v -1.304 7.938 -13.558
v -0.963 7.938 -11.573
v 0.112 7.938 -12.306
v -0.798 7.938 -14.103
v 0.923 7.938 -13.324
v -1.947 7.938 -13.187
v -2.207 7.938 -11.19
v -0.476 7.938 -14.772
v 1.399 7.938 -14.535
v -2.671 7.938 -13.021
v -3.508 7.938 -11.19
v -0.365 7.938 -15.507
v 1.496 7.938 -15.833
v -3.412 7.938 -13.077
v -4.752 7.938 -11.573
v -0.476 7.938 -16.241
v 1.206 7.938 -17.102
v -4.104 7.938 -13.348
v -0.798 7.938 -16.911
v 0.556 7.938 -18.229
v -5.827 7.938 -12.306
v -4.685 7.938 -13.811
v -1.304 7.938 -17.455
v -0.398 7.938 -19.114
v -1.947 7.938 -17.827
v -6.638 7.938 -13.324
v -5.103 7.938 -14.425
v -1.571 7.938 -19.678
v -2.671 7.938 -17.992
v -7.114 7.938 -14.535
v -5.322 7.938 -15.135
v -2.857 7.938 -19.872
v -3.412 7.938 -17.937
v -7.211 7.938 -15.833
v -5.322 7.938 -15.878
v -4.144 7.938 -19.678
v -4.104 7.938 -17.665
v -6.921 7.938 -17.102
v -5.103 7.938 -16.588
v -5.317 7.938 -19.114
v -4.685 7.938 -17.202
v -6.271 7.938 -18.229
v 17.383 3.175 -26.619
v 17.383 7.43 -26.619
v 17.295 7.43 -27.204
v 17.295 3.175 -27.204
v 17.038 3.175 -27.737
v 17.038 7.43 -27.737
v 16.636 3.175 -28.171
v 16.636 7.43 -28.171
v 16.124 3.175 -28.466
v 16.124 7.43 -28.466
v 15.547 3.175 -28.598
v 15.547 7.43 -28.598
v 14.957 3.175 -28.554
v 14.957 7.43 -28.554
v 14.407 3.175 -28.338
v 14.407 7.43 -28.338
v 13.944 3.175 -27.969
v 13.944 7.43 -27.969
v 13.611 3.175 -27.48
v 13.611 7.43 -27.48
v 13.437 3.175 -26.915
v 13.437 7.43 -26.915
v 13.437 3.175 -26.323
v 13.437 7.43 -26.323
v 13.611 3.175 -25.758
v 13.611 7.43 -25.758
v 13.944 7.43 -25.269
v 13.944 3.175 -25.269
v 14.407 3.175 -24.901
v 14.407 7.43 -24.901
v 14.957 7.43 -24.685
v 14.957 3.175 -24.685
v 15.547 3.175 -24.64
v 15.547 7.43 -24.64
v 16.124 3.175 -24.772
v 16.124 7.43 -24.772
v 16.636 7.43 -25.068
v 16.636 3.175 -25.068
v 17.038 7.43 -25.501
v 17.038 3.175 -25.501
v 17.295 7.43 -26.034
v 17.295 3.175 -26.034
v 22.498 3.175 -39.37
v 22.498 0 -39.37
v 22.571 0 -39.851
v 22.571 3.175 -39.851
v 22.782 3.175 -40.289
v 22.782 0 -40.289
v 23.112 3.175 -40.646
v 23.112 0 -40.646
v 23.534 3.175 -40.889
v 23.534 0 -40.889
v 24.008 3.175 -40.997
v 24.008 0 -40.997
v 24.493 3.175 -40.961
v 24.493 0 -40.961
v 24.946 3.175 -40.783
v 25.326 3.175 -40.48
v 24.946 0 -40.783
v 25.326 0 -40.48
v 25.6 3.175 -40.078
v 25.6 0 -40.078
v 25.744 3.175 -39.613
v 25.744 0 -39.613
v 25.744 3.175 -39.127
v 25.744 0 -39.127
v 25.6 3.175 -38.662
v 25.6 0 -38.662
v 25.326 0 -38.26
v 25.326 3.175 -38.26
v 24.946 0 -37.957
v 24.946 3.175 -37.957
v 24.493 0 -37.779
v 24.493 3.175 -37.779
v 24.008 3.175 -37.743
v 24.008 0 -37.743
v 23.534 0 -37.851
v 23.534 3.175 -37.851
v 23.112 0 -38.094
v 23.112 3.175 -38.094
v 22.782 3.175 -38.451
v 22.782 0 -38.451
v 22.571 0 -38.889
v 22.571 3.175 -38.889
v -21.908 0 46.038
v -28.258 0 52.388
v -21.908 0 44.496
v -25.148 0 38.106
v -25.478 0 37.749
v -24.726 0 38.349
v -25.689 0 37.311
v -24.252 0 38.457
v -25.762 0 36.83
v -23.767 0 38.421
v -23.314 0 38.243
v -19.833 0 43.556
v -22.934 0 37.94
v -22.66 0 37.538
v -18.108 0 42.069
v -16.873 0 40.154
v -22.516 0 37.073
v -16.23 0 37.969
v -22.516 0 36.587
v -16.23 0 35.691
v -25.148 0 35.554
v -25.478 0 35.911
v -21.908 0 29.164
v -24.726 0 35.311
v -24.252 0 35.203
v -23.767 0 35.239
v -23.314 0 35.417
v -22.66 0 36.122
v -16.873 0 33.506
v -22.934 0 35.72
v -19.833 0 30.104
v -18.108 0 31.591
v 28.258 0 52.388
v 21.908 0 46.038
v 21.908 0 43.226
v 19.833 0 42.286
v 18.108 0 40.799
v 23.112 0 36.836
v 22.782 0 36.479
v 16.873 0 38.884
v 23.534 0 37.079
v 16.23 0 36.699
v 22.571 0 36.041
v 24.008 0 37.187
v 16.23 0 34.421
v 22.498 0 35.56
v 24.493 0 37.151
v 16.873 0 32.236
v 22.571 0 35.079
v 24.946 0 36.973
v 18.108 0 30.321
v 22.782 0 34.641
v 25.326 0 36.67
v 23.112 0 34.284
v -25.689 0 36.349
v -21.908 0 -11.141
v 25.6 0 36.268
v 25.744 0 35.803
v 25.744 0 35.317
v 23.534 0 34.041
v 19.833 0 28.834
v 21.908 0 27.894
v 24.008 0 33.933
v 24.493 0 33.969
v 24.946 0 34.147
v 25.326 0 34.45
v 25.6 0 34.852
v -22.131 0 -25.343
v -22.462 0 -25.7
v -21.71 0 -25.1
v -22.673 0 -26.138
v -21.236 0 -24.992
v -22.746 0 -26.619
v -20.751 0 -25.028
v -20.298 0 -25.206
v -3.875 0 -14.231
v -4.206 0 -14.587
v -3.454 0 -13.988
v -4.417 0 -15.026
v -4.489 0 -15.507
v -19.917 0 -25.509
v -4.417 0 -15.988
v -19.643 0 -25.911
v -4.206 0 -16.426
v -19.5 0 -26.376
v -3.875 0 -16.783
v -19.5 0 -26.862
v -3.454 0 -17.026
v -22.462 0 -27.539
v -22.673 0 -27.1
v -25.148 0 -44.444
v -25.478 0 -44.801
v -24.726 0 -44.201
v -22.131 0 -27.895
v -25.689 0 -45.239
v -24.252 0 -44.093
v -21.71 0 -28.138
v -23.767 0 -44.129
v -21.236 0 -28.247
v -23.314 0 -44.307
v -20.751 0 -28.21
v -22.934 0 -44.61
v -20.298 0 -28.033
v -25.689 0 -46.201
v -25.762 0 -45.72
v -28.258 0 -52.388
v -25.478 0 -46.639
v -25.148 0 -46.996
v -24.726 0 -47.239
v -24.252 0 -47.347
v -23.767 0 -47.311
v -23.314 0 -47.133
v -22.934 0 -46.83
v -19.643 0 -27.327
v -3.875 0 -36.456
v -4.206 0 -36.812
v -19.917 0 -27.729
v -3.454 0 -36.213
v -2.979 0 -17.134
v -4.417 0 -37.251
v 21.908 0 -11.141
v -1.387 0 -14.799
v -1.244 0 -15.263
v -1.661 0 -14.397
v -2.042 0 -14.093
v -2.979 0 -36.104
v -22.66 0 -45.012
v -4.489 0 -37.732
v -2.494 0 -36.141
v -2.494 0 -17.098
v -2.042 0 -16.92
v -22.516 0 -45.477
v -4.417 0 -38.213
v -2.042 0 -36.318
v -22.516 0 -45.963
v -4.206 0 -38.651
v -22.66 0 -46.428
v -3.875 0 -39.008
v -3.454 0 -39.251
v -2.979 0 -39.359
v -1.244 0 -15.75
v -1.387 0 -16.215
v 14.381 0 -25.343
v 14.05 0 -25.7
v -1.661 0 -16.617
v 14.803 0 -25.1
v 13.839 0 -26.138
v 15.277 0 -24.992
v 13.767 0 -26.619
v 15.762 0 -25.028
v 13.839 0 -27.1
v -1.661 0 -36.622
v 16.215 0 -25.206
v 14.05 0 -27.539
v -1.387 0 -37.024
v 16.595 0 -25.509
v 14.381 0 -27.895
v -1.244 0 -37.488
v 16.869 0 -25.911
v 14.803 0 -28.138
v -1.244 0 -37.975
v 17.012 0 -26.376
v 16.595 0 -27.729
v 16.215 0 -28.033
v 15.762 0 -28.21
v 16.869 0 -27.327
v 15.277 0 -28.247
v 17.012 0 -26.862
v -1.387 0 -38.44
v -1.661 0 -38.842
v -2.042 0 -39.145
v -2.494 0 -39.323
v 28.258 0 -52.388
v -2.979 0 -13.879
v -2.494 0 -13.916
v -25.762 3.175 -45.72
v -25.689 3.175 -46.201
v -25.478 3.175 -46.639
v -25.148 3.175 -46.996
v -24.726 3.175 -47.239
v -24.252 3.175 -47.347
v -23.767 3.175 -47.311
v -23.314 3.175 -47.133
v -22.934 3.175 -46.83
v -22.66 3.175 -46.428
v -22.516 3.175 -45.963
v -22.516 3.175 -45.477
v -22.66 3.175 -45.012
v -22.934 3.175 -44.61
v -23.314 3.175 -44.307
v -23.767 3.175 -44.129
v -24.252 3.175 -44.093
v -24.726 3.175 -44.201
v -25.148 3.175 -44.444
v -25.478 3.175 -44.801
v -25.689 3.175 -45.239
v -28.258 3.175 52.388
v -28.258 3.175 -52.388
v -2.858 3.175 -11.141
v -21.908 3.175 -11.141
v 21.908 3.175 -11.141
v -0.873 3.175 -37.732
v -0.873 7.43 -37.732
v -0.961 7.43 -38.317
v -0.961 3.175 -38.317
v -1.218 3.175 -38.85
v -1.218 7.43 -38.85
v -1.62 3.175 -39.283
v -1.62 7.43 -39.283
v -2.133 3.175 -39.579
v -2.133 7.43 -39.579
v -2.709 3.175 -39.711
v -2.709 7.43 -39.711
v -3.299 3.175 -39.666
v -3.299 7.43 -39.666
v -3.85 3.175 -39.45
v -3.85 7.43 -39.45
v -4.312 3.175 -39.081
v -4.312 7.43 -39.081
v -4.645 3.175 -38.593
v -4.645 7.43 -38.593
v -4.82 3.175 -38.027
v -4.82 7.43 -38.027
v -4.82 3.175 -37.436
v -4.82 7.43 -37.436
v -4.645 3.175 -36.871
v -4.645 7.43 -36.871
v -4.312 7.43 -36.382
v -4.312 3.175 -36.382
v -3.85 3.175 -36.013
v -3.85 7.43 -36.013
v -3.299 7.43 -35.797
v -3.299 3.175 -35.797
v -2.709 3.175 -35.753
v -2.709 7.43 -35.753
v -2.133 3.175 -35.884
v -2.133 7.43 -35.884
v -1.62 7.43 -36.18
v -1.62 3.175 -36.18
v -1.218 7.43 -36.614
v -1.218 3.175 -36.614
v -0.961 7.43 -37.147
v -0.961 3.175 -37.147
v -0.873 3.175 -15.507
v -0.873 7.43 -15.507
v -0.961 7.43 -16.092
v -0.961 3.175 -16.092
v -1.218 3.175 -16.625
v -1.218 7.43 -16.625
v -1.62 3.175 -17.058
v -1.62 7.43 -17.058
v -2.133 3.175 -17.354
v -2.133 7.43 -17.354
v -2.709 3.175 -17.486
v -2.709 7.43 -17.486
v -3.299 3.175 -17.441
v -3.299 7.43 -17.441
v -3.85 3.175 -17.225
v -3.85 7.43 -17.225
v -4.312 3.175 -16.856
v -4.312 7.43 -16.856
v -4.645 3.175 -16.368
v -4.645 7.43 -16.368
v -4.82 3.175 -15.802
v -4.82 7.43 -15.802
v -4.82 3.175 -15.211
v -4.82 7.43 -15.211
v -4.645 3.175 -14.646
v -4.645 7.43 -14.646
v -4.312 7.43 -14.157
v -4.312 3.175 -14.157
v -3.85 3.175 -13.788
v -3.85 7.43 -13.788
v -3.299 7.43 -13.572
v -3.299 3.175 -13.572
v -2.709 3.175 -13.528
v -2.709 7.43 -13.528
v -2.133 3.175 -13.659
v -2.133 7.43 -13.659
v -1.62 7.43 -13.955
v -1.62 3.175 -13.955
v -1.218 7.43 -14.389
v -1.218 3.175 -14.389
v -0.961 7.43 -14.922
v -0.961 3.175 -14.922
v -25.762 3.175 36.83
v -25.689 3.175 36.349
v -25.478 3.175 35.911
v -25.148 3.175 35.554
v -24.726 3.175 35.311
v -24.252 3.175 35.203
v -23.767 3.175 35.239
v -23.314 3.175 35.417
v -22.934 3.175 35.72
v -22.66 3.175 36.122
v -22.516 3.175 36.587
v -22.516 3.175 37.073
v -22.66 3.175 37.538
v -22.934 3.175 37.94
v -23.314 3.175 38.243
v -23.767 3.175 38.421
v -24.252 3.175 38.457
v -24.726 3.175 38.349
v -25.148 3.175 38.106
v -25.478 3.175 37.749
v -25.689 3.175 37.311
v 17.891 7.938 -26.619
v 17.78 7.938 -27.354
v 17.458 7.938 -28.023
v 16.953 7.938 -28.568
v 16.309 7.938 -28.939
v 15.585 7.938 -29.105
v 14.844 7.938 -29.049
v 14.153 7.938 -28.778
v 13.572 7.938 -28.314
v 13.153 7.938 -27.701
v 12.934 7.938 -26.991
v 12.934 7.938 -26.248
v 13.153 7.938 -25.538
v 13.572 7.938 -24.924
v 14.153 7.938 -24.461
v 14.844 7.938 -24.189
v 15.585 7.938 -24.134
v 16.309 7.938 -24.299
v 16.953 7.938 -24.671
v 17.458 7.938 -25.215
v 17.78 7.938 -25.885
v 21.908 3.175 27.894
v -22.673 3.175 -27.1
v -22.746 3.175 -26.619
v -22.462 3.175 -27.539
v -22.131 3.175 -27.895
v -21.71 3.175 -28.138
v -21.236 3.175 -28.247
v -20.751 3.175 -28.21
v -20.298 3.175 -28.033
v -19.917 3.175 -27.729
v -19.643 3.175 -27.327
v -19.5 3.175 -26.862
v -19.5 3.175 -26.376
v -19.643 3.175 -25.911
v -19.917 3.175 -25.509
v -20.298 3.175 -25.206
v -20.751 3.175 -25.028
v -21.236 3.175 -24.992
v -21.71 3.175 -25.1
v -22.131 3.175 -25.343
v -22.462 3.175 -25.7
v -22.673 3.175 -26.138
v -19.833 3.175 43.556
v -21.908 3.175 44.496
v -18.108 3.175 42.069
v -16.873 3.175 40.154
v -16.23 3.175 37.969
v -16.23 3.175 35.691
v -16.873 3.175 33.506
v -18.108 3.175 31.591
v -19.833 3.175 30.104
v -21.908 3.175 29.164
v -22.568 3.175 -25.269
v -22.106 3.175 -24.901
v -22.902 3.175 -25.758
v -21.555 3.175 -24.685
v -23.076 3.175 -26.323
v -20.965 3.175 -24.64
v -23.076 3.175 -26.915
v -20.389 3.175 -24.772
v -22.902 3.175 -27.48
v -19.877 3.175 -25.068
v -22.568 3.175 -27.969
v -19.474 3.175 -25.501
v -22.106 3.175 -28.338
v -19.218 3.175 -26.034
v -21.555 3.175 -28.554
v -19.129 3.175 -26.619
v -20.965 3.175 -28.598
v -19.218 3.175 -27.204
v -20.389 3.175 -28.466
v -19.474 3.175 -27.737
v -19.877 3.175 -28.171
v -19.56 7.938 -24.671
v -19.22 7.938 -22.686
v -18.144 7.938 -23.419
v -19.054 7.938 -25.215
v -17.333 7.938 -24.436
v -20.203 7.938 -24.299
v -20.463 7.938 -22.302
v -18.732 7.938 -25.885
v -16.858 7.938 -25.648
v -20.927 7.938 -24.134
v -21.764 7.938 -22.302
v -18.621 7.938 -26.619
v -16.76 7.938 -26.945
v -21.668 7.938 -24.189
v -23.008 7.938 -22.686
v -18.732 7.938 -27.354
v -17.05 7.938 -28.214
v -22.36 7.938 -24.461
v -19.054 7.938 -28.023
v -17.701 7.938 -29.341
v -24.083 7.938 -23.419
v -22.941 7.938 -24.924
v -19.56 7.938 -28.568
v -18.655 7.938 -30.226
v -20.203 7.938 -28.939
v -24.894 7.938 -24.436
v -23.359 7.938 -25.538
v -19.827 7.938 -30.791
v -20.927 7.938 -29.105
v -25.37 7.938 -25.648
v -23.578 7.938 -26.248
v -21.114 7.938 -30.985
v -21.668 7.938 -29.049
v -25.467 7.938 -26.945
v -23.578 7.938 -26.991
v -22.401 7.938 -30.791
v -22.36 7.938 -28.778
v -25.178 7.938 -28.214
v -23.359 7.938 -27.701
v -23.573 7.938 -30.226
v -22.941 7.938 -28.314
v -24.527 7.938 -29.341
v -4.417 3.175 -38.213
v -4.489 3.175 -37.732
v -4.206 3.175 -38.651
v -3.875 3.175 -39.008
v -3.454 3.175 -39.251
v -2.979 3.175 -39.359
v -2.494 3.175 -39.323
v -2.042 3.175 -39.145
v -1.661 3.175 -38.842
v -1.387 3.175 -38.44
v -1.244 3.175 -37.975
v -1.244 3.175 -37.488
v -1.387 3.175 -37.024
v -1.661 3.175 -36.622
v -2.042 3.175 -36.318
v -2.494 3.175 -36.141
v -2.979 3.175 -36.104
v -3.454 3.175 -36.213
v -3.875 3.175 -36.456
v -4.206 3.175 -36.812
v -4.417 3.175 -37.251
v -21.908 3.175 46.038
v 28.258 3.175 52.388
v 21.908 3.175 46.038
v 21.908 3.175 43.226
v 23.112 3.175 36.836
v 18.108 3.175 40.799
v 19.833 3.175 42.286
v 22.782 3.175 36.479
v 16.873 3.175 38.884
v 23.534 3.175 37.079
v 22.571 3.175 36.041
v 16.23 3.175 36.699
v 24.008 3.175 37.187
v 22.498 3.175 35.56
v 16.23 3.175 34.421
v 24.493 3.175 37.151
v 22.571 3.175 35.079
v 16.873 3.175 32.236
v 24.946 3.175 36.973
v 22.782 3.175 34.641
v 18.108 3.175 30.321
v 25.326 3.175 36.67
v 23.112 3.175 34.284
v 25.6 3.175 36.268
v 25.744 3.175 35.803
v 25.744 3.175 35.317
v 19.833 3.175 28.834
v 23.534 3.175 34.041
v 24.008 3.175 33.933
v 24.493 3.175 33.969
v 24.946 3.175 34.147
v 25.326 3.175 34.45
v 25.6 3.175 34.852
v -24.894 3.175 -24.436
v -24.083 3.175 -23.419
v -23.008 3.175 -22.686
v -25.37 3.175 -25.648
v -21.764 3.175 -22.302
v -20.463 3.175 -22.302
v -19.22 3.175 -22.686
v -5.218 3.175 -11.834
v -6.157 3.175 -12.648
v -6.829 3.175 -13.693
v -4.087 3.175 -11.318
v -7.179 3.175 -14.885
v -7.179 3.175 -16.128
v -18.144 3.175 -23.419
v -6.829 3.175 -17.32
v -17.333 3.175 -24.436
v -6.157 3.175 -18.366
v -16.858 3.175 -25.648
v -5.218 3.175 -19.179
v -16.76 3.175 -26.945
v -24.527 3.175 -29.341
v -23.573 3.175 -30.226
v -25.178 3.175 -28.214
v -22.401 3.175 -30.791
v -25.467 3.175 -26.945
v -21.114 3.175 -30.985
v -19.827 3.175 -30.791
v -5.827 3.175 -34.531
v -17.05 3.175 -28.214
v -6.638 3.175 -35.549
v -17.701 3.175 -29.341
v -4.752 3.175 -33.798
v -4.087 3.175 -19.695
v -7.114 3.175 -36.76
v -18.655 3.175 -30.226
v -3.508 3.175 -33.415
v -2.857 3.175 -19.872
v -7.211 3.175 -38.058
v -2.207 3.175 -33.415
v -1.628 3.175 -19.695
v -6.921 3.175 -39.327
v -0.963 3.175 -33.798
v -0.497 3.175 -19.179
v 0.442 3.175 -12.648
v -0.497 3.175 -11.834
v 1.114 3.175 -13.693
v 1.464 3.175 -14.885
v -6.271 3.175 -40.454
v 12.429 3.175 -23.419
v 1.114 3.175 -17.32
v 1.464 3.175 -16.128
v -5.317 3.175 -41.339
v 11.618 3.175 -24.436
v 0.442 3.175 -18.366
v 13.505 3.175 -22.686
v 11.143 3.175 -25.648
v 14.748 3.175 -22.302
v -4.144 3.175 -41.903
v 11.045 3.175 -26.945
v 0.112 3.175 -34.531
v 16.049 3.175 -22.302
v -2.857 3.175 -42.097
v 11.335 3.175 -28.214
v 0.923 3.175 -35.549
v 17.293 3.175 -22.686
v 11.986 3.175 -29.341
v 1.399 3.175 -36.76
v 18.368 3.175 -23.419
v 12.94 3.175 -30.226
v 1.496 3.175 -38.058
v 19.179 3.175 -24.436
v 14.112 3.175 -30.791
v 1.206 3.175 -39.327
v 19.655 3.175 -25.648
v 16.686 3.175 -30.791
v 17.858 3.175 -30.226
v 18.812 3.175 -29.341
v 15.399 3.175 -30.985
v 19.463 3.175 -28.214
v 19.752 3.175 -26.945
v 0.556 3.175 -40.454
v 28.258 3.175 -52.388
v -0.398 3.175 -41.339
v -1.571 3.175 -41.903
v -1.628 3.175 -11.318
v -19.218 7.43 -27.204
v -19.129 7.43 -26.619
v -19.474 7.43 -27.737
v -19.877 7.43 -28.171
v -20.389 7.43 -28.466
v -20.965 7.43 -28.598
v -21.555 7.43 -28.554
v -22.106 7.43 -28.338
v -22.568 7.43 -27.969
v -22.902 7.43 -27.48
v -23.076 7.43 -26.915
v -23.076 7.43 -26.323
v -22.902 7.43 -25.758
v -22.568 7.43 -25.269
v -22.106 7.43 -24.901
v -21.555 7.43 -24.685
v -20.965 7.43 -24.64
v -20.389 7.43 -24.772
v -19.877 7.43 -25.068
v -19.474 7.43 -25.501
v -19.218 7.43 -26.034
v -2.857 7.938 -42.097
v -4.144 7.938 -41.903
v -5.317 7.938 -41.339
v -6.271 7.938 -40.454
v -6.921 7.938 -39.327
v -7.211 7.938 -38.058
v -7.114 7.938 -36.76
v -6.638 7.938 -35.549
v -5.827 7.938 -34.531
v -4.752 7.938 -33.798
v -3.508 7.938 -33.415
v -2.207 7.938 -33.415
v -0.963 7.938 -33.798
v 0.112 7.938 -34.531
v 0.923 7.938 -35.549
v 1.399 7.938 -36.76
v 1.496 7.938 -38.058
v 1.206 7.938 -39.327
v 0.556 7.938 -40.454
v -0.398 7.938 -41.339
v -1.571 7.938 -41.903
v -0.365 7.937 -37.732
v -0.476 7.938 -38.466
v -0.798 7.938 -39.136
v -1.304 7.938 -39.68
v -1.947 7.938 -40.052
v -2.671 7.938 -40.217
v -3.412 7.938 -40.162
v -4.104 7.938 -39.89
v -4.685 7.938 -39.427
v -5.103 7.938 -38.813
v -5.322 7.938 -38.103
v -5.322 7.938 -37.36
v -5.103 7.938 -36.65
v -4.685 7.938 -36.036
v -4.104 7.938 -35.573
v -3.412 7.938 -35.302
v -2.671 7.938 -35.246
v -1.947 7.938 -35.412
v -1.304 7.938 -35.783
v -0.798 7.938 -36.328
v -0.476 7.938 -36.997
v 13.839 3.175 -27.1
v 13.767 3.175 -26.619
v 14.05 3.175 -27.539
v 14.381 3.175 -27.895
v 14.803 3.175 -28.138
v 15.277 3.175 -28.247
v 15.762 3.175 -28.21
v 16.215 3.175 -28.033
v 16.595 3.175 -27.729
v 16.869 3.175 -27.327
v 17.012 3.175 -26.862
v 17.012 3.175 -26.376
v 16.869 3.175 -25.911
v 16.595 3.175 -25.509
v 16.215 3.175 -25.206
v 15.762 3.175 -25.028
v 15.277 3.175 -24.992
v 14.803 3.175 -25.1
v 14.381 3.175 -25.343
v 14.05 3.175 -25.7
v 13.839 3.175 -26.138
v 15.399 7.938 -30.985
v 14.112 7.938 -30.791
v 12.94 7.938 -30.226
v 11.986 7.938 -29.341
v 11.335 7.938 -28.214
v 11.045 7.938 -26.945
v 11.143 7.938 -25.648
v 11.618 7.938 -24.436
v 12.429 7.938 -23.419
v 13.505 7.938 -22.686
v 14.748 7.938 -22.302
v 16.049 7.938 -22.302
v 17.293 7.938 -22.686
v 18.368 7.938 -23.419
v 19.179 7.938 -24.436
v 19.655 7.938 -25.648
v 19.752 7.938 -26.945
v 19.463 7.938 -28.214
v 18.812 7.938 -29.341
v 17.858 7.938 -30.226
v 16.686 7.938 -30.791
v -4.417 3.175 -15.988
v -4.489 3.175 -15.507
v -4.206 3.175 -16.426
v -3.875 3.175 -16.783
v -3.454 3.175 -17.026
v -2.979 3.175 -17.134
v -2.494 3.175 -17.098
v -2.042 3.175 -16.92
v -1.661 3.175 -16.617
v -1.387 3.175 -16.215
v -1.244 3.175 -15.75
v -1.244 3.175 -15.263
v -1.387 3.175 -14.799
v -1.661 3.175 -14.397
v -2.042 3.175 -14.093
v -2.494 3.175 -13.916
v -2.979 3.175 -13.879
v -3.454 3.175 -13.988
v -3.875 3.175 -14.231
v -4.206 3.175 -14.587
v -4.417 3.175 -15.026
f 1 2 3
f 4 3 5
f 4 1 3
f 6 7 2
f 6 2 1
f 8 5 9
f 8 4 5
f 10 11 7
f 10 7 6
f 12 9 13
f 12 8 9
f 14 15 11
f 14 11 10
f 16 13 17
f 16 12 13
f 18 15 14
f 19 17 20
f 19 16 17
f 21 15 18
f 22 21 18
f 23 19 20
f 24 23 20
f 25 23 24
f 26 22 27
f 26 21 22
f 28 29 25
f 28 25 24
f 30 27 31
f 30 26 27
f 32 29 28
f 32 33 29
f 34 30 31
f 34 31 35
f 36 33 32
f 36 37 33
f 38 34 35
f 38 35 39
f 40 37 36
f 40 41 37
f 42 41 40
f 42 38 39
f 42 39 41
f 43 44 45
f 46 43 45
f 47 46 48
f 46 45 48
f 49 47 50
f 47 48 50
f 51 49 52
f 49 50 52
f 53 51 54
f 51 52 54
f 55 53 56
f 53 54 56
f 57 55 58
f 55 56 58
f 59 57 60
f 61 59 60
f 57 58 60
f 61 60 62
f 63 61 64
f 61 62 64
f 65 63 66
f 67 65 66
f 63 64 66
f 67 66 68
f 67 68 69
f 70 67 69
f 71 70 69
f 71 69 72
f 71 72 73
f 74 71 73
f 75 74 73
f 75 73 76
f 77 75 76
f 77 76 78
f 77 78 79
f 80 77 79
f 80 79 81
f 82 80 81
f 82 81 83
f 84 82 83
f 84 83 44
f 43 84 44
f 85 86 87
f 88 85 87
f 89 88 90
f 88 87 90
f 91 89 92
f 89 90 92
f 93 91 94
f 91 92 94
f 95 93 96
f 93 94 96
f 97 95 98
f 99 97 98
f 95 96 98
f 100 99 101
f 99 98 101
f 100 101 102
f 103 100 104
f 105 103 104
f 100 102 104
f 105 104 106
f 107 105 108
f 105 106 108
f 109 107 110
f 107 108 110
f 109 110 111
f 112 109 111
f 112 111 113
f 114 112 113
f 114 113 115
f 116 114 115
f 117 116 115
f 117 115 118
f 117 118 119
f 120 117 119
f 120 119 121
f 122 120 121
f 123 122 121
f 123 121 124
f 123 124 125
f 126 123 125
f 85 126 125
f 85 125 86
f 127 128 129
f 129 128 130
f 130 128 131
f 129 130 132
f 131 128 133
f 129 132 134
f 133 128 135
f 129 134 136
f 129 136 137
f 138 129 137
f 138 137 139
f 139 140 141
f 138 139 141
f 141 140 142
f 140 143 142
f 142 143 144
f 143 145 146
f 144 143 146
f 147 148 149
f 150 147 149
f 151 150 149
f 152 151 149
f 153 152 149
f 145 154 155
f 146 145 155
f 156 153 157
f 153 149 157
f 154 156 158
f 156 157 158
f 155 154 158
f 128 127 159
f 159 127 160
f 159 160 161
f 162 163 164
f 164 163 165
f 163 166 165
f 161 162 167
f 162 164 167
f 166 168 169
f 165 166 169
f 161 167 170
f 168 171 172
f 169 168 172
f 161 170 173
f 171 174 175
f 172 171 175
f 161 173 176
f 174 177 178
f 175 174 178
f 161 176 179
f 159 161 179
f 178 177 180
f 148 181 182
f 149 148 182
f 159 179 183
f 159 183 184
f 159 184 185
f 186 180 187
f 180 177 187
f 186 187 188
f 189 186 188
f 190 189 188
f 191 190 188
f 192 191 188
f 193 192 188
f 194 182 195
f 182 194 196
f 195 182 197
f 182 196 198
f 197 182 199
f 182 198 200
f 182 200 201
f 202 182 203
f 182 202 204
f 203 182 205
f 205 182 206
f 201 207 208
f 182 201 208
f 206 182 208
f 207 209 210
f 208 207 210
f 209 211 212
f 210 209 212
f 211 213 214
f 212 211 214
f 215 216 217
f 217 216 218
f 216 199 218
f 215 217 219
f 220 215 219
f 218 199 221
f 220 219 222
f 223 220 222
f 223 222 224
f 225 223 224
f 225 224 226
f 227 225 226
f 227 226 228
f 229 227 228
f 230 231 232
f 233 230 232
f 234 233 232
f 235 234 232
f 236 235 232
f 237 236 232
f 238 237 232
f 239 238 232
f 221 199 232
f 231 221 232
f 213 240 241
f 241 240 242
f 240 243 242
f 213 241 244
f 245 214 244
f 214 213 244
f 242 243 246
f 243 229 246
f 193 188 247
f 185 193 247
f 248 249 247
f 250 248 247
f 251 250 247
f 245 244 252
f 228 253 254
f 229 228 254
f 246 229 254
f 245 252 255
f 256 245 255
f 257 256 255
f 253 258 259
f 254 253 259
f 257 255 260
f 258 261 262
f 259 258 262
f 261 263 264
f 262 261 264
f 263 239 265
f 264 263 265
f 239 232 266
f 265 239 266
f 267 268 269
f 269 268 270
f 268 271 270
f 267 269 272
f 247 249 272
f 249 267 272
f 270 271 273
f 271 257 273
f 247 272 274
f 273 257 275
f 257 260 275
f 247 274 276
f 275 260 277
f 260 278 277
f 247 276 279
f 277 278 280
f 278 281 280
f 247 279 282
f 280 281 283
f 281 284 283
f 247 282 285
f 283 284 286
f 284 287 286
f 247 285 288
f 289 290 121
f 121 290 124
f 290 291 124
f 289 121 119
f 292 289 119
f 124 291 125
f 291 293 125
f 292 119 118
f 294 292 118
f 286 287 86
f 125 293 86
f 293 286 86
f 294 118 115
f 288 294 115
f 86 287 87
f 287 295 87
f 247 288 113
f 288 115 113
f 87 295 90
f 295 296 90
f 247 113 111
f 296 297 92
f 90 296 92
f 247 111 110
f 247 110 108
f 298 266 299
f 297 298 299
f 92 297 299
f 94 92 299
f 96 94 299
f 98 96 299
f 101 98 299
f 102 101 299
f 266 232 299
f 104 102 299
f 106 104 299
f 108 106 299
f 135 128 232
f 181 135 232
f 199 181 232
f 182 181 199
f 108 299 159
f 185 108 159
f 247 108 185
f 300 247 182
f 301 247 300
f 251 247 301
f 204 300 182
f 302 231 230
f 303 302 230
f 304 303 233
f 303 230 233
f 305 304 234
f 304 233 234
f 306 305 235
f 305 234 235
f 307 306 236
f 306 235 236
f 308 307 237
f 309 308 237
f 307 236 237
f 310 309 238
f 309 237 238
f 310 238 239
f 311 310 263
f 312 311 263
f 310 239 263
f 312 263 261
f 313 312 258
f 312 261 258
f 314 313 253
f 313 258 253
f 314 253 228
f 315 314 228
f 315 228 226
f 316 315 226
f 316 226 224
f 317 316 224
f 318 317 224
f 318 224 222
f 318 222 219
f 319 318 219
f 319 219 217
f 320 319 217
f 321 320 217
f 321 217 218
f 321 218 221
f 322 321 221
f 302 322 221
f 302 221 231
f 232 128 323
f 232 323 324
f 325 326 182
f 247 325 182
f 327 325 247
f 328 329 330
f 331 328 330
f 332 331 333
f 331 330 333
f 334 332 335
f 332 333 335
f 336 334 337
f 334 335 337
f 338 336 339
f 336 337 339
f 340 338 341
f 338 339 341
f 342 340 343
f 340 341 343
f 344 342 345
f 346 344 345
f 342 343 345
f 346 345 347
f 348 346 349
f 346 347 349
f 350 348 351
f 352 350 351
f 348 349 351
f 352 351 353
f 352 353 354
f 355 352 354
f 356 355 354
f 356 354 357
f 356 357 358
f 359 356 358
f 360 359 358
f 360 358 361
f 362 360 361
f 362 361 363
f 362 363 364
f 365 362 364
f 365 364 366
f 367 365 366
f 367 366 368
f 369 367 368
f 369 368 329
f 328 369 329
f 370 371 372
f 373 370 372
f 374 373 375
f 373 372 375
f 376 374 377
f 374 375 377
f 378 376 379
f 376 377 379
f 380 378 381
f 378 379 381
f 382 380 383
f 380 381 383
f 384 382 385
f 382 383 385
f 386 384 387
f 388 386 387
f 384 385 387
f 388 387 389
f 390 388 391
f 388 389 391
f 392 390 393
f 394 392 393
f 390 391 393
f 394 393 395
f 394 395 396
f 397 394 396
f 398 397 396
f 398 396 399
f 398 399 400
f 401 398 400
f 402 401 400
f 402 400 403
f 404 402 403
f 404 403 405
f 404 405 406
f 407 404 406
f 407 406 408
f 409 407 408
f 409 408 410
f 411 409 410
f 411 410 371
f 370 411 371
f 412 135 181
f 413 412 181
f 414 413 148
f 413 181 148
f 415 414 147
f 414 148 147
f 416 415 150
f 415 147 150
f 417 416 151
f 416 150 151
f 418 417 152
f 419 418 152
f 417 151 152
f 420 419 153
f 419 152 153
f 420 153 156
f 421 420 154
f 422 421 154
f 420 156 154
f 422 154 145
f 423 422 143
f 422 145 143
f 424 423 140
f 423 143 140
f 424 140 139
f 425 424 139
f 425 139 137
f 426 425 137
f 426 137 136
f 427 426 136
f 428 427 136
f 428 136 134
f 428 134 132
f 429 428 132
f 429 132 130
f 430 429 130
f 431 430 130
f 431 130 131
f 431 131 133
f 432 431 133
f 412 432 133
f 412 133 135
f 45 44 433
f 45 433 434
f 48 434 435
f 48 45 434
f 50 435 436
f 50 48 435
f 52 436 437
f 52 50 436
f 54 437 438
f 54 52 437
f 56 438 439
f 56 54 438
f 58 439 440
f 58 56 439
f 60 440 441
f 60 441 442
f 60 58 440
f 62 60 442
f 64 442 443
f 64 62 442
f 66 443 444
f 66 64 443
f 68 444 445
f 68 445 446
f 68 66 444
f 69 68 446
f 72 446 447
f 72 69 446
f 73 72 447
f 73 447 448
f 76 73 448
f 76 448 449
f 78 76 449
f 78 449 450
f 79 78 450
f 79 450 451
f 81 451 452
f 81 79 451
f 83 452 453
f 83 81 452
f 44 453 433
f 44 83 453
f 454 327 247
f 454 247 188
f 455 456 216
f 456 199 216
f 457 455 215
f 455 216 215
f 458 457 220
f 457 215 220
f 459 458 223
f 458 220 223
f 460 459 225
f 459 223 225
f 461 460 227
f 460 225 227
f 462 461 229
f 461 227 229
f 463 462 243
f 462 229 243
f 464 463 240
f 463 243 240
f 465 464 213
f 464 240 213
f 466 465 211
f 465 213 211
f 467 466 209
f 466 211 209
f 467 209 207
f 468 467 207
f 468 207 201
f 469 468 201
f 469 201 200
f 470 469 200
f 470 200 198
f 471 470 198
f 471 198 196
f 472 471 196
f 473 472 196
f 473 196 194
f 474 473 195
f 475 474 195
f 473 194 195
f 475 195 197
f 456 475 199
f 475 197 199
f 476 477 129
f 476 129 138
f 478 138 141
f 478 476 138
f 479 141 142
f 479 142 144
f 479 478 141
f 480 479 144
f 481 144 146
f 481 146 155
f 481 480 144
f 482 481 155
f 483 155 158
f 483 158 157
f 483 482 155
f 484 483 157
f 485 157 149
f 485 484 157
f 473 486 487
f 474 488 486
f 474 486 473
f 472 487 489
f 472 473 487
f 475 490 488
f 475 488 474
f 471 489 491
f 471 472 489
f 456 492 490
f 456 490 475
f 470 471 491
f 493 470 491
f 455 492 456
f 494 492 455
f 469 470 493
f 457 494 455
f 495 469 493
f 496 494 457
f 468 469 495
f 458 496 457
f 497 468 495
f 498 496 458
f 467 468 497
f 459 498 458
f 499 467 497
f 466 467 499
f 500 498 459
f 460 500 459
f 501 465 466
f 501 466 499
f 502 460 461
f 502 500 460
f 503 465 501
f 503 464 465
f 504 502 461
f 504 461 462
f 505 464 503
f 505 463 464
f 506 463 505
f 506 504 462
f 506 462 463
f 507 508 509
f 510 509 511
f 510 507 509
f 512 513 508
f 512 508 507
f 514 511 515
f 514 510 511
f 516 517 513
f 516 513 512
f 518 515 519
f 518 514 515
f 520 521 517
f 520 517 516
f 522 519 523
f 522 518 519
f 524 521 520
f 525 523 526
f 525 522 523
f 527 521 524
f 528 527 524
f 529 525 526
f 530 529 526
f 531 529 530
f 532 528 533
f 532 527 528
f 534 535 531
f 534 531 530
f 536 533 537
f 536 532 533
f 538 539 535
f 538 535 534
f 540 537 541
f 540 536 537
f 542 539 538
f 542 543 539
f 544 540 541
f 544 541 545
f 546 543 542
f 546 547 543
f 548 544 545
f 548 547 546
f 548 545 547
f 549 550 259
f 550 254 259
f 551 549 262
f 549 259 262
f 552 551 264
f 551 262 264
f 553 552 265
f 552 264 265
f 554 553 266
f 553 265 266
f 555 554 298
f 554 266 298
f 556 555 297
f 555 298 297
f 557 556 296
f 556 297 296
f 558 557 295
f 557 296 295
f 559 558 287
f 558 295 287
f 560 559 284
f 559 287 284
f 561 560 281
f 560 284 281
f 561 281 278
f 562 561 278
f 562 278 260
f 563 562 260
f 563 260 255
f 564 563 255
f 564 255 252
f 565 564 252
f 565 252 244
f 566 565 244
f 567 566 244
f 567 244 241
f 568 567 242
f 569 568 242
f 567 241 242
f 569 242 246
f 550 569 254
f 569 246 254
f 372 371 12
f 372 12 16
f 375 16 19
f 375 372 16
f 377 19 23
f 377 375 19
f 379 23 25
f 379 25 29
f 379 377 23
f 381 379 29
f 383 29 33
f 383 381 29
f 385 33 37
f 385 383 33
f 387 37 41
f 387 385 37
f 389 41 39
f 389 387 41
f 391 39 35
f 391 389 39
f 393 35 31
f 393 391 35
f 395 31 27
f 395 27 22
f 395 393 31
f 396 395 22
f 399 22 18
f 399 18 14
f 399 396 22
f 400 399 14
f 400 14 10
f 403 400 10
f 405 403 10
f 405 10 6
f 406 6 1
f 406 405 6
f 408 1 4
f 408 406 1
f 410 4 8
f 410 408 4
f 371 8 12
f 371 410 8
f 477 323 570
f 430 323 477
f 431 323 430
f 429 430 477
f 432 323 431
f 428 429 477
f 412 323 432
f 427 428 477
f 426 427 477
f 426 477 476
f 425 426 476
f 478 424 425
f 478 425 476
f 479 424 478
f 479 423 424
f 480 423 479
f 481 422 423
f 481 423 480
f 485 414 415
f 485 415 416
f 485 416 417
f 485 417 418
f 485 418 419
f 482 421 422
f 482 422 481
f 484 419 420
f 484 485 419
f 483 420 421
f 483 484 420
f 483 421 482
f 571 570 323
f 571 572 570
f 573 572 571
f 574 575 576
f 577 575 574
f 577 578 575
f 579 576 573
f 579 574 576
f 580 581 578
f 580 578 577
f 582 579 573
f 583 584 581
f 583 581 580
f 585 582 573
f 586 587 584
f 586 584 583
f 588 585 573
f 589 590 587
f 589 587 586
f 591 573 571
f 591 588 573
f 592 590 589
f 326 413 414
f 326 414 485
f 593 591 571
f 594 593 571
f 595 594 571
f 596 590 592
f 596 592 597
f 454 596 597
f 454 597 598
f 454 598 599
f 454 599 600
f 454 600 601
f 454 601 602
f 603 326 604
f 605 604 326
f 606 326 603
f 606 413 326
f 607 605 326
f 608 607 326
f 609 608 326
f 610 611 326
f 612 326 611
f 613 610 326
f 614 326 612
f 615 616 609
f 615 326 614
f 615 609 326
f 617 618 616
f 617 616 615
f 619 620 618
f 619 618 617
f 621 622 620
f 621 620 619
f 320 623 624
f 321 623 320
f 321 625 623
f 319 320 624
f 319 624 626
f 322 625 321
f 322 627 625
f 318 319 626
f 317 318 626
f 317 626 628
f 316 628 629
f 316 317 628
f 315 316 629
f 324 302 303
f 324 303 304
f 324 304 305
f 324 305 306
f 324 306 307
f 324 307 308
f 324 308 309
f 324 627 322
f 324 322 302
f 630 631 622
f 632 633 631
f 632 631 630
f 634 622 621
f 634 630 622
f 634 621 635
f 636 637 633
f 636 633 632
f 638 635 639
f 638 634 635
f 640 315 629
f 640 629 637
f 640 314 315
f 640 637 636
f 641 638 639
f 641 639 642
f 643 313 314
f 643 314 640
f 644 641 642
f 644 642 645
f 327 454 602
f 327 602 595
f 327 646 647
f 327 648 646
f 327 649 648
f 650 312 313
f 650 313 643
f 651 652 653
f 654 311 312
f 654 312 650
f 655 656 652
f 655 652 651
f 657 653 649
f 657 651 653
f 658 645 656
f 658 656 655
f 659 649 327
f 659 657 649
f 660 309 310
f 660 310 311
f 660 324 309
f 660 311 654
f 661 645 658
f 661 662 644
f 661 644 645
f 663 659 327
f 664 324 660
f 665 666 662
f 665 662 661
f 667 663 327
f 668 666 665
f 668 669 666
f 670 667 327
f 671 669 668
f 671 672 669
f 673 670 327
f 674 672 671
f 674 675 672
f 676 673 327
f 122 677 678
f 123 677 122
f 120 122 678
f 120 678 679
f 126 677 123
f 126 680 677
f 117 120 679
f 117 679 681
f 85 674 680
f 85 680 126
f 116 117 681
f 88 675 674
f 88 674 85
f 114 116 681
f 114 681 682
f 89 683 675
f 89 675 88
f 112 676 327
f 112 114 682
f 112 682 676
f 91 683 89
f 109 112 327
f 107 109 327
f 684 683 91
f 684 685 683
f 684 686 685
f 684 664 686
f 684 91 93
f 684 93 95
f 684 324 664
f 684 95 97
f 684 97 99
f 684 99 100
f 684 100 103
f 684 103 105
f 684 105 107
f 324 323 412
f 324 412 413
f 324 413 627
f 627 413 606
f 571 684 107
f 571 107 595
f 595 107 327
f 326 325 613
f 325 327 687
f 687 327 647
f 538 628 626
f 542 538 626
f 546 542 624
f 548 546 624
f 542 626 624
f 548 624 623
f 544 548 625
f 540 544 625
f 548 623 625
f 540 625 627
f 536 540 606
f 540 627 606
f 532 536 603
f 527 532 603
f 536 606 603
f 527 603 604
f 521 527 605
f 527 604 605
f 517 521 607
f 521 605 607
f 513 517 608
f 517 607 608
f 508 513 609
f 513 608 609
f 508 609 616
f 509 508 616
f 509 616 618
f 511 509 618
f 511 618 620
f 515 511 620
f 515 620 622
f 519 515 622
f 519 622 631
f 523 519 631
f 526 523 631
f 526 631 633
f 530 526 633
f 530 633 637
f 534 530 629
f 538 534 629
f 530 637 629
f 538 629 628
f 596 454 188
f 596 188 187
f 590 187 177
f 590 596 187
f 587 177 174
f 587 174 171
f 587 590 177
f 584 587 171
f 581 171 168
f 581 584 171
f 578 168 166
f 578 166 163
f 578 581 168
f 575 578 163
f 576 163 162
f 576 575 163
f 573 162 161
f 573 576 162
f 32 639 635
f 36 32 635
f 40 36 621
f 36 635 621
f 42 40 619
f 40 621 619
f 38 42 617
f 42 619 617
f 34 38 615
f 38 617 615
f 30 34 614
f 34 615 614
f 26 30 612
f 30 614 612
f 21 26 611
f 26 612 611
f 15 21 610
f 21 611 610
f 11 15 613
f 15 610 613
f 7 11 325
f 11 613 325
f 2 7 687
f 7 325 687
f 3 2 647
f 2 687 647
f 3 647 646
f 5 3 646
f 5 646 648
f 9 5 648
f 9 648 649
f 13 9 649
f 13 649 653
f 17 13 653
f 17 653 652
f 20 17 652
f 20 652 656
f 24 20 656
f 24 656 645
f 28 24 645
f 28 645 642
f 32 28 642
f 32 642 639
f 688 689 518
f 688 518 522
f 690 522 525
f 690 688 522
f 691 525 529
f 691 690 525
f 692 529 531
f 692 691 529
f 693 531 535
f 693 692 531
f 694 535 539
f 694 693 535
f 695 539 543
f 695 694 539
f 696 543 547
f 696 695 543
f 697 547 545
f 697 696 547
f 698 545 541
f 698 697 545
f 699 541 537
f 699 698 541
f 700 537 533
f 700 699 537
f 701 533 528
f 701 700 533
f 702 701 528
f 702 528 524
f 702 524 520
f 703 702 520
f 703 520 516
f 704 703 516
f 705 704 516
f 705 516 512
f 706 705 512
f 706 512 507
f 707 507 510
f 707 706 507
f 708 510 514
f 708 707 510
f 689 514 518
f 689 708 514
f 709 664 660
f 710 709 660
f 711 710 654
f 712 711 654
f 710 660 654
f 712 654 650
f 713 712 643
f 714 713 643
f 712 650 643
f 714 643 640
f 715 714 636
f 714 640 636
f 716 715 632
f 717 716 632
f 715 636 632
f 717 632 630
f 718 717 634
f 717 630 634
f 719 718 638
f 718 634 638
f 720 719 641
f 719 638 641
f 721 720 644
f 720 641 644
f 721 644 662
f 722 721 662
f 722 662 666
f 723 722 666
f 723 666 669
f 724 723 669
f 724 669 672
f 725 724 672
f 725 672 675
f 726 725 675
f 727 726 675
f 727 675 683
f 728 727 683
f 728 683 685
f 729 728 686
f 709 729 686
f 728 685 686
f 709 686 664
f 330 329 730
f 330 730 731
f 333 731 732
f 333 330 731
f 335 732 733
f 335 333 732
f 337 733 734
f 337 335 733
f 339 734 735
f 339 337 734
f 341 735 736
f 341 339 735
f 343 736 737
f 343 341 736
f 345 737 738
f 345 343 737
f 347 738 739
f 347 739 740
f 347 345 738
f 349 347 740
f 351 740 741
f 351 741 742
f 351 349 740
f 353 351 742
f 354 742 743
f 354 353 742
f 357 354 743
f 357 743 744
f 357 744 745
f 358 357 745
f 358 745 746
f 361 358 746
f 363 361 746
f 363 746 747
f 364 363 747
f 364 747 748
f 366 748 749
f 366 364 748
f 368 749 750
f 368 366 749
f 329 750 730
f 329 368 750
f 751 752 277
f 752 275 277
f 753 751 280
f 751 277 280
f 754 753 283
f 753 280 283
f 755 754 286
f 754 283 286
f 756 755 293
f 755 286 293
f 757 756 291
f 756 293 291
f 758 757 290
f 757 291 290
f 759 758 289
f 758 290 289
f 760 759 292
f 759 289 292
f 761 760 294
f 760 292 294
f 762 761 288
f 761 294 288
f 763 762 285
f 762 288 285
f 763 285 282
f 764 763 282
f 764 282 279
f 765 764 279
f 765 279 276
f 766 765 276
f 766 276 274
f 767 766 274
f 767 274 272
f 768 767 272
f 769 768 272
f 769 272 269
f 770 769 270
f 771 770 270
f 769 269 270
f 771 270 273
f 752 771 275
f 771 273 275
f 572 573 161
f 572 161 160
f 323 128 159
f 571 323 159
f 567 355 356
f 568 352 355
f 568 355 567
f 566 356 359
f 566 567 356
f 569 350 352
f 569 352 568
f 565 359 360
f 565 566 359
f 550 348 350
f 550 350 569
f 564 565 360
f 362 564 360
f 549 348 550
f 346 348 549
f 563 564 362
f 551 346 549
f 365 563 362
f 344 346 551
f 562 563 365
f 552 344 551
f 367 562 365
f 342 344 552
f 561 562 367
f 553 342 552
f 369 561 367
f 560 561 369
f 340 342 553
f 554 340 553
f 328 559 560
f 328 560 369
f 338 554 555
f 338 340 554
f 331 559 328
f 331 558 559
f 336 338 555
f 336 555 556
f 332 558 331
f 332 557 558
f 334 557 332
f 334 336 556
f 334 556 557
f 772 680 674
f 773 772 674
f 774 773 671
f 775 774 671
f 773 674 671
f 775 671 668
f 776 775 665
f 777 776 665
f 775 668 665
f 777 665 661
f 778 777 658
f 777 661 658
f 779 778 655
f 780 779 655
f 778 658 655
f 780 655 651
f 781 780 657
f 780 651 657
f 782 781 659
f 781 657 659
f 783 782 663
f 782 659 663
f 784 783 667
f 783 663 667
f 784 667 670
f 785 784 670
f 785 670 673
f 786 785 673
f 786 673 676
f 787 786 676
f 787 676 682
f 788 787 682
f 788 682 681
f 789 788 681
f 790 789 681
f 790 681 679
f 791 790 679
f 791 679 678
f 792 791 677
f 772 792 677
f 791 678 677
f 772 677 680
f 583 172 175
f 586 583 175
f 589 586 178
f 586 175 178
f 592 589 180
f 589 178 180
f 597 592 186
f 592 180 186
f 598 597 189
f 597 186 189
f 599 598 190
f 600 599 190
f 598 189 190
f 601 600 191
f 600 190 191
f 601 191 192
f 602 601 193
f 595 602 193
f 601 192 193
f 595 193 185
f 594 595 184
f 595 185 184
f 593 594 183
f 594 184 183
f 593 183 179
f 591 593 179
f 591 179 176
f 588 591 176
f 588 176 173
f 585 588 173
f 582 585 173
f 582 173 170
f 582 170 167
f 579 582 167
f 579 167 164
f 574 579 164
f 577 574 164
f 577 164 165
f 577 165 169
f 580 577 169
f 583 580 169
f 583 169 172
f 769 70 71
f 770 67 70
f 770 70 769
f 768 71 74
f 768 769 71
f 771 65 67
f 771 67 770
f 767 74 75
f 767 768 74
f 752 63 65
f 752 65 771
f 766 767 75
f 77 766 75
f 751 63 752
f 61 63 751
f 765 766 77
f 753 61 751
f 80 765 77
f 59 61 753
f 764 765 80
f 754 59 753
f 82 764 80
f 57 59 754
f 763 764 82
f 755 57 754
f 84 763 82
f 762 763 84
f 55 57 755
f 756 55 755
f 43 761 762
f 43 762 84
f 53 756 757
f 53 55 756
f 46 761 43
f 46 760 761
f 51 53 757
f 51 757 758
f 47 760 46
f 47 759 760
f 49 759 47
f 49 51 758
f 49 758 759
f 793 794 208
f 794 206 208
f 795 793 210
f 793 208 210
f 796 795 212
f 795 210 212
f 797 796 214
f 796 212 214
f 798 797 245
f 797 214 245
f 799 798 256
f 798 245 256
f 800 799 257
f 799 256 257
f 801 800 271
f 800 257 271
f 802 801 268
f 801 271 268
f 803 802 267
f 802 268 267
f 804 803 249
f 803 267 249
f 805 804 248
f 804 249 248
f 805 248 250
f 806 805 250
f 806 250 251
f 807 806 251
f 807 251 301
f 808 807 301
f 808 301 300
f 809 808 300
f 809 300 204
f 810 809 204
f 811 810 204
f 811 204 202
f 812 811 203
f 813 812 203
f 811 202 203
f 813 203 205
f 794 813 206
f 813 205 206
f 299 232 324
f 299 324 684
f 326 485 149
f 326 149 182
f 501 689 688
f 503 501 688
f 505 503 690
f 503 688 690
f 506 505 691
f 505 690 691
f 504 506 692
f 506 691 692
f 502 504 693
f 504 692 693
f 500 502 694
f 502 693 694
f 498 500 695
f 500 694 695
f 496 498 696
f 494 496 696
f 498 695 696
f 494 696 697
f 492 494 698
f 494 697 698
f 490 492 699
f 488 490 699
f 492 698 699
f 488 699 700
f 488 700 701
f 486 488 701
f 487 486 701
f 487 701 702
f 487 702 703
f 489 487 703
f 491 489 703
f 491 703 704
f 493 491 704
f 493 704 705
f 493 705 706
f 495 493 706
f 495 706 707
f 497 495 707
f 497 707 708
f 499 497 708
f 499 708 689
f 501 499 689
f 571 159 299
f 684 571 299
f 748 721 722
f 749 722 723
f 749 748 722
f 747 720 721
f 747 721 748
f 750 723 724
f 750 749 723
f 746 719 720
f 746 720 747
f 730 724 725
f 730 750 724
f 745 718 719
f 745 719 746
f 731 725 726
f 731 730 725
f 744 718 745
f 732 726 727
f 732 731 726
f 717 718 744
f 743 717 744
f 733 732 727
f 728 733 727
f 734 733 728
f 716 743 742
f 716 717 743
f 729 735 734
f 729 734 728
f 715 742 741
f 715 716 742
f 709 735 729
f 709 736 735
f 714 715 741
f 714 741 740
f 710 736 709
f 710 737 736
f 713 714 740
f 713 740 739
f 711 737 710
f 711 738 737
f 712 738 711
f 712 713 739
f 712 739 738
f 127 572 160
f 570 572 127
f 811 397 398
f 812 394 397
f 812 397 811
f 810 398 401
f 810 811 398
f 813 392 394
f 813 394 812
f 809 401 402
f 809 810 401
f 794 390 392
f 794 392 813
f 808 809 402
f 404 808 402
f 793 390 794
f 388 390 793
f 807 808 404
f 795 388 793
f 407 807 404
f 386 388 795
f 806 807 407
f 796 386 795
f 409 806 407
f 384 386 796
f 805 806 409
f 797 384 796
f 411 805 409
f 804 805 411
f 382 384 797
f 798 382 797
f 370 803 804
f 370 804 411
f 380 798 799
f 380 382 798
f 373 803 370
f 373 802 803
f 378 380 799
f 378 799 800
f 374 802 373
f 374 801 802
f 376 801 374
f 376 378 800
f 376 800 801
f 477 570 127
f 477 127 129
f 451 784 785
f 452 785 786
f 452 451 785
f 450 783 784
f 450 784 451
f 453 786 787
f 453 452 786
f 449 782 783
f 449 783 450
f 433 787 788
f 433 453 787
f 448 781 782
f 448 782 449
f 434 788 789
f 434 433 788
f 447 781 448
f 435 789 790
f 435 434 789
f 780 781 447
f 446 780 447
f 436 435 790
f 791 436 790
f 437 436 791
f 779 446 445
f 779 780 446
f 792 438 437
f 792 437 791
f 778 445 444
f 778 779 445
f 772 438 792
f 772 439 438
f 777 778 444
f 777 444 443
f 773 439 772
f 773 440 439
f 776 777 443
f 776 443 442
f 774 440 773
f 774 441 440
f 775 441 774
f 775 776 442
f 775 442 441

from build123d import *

# Parameters (mm, degrees)
SKETCH1_W                                      = 53.34
SKETCH1_H                                      = 101.6
PCB_PLATE_DEPTH                                = 3.175
F_4_CLEARANCE_HOLE1_D                          = 3.2639
SKETCH5_W                                      = 56.515
SKETCH5_H                                      = 104.775
SKETCH5_W_2                                    = 53.34
SKETCH5_H_2                                    = 101.6
BORDER_MATERIAL_DEPTH                          = 3.175
SKETCH9_R                                      = 4.365625
BOSS_EXTRUDE3_DEPTH                            = 4.7625
CBORE_FOR_4_SOCKET_HEAD_CAP_SCREW3_D           = 3.2639
CBORE_FOR_4_SOCKET_HEAD_CAP_SCREW3_CBORE_D     = 3.96875
CBORE_FOR_4_SOCKET_HEAD_CAP_SCREW3_CBORE_DEPTH = 4.7625
MATERIAL_REDUCTION_CUT_REACH                   = 61.713
CHAMFER2_SIZE                                  = 0.508


with BuildPart() as part:
    # Sketch1 → PCB Plate (new body)
    with BuildSketch(Plane(origin=(0, 0, 0), x_dir=(1, 0, 0), z_dir=(0, 1, 0))):
        Rectangle(SKETCH1_W, SKETCH1_H)
    extrude(amount=PCB_PLATE_DEPTH)

    # #4 Clearance Hole1 (through all)
    with Locations(Plane(origin=(0, 3.175, 0), x_dir=(1, 0, 0), z_dir=(0, 1, 0))):
        with Locations((-24.13, -36.83), (-24.13, 45.72), (24.13, -35.56), (24.13, 39.37)):
            Hole(F_4_CLEARANCE_HOLE1_D / 2)

    # Sketch5 → Border Material (add)
    with BuildSketch(Plane(origin=(0, 0, 0), x_dir=(1, 0, 0), z_dir=(0, 1, 0))):
        Rectangle(SKETCH5_W, SKETCH5_H)
        Rectangle(SKETCH5_W_2, SKETCH5_H_2, mode=Mode.SUBTRACT)
    extrude(amount=BORDER_MATERIAL_DEPTH)

    # Sketch9 → Boss-Extrude3 (add)
    with BuildSketch(Plane(origin=(0, 3.175, 0), x_dir=(1, 0, 0), z_dir=(0, 1, 0))):
        with Locations(Location((-2.8575, 37.7317, 0), (0, 0, 90))):
            Circle(SKETCH9_R)
        with Locations(Location((-21.11375, 26.6192, 0), (0, 0, 90))):
            Circle(SKETCH9_R)
        with Locations(Location((-2.8575, 15.5067, 0), (0, 0, 90))):
            Circle(SKETCH9_R)
        with Locations(Location((15.39875, 26.6192, 0), (0, 0, 90))):
            Circle(SKETCH9_R)
    extrude(amount=BOSS_EXTRUDE3_DEPTH)

    # CBORE for #4 Socket Head Cap Screw3 (through all)
    with Locations(Plane(origin=(0, 7.9375, 0), x_dir=(1, 0, 0), z_dir=(0, 1, 0))):
        with Locations((-2.8575, 37.7317), (-21.11375, 26.6192), (-2.8575, 15.5067), (15.39875, 26.6192)):
            CounterBoreHole(CBORE_FOR_4_SOCKET_HEAD_CAP_SCREW3_D / 2, CBORE_FOR_4_SOCKET_HEAD_CAP_SCREW3_CBORE_D / 2, CBORE_FOR_4_SOCKET_HEAD_CAP_SCREW3_CBORE_DEPTH)

    # Sketch8 → Material Reduction Cut (cut, up to next)
    with BuildSketch(Plane(origin=(0, 3.175, 0), x_dir=(1, 0, 0), z_dir=(0, 1, 0)), mode=Mode.PRIVATE) as material_reduction_cut_sk1:
        with BuildLine():
            Line((-21.9075, 11.141075), (21.9075, 11.141075))
            Line((21.9075, 11.141075), (21.9075, -27.893708879))
            ThreePointArc((21.9075, -27.893708879), (16.14805, -35.56), (21.9075, -43.226291121))
            Line((21.9075, -43.226291121), (21.9075, -46.0375))
            Line((21.9075, -46.0375), (-21.9075, -46.0375))
            Line((-21.9075, -46.0375), (-21.9075, -44.496291121))
            ThreePointArc((-21.9075, -44.496291121), (-16.14805, -36.83), (-21.9075, -29.163708879))
            Line((-21.9075, -29.163708879), (-21.9075, 11.141075))
        make_face()
    material_reduction_cut_tool1 = extrude(material_reduction_cut_sk1.sketch, amount=-MATERIAL_REDUCTION_CUT_REACH, mode=Mode.PRIVATE) & part.part
    add(material_reduction_cut_tool1.solids().sort_by_distance((0, 3.175, 16.421161))[0], mode=Mode.SUBTRACT)

    # Chamfer2
    chamfer2_edges = [part.edges().sort_by_distance(p)[0] for p in [
        (13.414375, 7.9375, -26.6192),
        (-4.841875, 7.9375, -15.5067),
        (-23.098125, 7.9375, -26.6192),
        (-4.841875, 7.9375, -37.7317),
    ]]
    chamfer(chamfer2_edges, length=CHAMFER2_SIZE)


solid = part.part
